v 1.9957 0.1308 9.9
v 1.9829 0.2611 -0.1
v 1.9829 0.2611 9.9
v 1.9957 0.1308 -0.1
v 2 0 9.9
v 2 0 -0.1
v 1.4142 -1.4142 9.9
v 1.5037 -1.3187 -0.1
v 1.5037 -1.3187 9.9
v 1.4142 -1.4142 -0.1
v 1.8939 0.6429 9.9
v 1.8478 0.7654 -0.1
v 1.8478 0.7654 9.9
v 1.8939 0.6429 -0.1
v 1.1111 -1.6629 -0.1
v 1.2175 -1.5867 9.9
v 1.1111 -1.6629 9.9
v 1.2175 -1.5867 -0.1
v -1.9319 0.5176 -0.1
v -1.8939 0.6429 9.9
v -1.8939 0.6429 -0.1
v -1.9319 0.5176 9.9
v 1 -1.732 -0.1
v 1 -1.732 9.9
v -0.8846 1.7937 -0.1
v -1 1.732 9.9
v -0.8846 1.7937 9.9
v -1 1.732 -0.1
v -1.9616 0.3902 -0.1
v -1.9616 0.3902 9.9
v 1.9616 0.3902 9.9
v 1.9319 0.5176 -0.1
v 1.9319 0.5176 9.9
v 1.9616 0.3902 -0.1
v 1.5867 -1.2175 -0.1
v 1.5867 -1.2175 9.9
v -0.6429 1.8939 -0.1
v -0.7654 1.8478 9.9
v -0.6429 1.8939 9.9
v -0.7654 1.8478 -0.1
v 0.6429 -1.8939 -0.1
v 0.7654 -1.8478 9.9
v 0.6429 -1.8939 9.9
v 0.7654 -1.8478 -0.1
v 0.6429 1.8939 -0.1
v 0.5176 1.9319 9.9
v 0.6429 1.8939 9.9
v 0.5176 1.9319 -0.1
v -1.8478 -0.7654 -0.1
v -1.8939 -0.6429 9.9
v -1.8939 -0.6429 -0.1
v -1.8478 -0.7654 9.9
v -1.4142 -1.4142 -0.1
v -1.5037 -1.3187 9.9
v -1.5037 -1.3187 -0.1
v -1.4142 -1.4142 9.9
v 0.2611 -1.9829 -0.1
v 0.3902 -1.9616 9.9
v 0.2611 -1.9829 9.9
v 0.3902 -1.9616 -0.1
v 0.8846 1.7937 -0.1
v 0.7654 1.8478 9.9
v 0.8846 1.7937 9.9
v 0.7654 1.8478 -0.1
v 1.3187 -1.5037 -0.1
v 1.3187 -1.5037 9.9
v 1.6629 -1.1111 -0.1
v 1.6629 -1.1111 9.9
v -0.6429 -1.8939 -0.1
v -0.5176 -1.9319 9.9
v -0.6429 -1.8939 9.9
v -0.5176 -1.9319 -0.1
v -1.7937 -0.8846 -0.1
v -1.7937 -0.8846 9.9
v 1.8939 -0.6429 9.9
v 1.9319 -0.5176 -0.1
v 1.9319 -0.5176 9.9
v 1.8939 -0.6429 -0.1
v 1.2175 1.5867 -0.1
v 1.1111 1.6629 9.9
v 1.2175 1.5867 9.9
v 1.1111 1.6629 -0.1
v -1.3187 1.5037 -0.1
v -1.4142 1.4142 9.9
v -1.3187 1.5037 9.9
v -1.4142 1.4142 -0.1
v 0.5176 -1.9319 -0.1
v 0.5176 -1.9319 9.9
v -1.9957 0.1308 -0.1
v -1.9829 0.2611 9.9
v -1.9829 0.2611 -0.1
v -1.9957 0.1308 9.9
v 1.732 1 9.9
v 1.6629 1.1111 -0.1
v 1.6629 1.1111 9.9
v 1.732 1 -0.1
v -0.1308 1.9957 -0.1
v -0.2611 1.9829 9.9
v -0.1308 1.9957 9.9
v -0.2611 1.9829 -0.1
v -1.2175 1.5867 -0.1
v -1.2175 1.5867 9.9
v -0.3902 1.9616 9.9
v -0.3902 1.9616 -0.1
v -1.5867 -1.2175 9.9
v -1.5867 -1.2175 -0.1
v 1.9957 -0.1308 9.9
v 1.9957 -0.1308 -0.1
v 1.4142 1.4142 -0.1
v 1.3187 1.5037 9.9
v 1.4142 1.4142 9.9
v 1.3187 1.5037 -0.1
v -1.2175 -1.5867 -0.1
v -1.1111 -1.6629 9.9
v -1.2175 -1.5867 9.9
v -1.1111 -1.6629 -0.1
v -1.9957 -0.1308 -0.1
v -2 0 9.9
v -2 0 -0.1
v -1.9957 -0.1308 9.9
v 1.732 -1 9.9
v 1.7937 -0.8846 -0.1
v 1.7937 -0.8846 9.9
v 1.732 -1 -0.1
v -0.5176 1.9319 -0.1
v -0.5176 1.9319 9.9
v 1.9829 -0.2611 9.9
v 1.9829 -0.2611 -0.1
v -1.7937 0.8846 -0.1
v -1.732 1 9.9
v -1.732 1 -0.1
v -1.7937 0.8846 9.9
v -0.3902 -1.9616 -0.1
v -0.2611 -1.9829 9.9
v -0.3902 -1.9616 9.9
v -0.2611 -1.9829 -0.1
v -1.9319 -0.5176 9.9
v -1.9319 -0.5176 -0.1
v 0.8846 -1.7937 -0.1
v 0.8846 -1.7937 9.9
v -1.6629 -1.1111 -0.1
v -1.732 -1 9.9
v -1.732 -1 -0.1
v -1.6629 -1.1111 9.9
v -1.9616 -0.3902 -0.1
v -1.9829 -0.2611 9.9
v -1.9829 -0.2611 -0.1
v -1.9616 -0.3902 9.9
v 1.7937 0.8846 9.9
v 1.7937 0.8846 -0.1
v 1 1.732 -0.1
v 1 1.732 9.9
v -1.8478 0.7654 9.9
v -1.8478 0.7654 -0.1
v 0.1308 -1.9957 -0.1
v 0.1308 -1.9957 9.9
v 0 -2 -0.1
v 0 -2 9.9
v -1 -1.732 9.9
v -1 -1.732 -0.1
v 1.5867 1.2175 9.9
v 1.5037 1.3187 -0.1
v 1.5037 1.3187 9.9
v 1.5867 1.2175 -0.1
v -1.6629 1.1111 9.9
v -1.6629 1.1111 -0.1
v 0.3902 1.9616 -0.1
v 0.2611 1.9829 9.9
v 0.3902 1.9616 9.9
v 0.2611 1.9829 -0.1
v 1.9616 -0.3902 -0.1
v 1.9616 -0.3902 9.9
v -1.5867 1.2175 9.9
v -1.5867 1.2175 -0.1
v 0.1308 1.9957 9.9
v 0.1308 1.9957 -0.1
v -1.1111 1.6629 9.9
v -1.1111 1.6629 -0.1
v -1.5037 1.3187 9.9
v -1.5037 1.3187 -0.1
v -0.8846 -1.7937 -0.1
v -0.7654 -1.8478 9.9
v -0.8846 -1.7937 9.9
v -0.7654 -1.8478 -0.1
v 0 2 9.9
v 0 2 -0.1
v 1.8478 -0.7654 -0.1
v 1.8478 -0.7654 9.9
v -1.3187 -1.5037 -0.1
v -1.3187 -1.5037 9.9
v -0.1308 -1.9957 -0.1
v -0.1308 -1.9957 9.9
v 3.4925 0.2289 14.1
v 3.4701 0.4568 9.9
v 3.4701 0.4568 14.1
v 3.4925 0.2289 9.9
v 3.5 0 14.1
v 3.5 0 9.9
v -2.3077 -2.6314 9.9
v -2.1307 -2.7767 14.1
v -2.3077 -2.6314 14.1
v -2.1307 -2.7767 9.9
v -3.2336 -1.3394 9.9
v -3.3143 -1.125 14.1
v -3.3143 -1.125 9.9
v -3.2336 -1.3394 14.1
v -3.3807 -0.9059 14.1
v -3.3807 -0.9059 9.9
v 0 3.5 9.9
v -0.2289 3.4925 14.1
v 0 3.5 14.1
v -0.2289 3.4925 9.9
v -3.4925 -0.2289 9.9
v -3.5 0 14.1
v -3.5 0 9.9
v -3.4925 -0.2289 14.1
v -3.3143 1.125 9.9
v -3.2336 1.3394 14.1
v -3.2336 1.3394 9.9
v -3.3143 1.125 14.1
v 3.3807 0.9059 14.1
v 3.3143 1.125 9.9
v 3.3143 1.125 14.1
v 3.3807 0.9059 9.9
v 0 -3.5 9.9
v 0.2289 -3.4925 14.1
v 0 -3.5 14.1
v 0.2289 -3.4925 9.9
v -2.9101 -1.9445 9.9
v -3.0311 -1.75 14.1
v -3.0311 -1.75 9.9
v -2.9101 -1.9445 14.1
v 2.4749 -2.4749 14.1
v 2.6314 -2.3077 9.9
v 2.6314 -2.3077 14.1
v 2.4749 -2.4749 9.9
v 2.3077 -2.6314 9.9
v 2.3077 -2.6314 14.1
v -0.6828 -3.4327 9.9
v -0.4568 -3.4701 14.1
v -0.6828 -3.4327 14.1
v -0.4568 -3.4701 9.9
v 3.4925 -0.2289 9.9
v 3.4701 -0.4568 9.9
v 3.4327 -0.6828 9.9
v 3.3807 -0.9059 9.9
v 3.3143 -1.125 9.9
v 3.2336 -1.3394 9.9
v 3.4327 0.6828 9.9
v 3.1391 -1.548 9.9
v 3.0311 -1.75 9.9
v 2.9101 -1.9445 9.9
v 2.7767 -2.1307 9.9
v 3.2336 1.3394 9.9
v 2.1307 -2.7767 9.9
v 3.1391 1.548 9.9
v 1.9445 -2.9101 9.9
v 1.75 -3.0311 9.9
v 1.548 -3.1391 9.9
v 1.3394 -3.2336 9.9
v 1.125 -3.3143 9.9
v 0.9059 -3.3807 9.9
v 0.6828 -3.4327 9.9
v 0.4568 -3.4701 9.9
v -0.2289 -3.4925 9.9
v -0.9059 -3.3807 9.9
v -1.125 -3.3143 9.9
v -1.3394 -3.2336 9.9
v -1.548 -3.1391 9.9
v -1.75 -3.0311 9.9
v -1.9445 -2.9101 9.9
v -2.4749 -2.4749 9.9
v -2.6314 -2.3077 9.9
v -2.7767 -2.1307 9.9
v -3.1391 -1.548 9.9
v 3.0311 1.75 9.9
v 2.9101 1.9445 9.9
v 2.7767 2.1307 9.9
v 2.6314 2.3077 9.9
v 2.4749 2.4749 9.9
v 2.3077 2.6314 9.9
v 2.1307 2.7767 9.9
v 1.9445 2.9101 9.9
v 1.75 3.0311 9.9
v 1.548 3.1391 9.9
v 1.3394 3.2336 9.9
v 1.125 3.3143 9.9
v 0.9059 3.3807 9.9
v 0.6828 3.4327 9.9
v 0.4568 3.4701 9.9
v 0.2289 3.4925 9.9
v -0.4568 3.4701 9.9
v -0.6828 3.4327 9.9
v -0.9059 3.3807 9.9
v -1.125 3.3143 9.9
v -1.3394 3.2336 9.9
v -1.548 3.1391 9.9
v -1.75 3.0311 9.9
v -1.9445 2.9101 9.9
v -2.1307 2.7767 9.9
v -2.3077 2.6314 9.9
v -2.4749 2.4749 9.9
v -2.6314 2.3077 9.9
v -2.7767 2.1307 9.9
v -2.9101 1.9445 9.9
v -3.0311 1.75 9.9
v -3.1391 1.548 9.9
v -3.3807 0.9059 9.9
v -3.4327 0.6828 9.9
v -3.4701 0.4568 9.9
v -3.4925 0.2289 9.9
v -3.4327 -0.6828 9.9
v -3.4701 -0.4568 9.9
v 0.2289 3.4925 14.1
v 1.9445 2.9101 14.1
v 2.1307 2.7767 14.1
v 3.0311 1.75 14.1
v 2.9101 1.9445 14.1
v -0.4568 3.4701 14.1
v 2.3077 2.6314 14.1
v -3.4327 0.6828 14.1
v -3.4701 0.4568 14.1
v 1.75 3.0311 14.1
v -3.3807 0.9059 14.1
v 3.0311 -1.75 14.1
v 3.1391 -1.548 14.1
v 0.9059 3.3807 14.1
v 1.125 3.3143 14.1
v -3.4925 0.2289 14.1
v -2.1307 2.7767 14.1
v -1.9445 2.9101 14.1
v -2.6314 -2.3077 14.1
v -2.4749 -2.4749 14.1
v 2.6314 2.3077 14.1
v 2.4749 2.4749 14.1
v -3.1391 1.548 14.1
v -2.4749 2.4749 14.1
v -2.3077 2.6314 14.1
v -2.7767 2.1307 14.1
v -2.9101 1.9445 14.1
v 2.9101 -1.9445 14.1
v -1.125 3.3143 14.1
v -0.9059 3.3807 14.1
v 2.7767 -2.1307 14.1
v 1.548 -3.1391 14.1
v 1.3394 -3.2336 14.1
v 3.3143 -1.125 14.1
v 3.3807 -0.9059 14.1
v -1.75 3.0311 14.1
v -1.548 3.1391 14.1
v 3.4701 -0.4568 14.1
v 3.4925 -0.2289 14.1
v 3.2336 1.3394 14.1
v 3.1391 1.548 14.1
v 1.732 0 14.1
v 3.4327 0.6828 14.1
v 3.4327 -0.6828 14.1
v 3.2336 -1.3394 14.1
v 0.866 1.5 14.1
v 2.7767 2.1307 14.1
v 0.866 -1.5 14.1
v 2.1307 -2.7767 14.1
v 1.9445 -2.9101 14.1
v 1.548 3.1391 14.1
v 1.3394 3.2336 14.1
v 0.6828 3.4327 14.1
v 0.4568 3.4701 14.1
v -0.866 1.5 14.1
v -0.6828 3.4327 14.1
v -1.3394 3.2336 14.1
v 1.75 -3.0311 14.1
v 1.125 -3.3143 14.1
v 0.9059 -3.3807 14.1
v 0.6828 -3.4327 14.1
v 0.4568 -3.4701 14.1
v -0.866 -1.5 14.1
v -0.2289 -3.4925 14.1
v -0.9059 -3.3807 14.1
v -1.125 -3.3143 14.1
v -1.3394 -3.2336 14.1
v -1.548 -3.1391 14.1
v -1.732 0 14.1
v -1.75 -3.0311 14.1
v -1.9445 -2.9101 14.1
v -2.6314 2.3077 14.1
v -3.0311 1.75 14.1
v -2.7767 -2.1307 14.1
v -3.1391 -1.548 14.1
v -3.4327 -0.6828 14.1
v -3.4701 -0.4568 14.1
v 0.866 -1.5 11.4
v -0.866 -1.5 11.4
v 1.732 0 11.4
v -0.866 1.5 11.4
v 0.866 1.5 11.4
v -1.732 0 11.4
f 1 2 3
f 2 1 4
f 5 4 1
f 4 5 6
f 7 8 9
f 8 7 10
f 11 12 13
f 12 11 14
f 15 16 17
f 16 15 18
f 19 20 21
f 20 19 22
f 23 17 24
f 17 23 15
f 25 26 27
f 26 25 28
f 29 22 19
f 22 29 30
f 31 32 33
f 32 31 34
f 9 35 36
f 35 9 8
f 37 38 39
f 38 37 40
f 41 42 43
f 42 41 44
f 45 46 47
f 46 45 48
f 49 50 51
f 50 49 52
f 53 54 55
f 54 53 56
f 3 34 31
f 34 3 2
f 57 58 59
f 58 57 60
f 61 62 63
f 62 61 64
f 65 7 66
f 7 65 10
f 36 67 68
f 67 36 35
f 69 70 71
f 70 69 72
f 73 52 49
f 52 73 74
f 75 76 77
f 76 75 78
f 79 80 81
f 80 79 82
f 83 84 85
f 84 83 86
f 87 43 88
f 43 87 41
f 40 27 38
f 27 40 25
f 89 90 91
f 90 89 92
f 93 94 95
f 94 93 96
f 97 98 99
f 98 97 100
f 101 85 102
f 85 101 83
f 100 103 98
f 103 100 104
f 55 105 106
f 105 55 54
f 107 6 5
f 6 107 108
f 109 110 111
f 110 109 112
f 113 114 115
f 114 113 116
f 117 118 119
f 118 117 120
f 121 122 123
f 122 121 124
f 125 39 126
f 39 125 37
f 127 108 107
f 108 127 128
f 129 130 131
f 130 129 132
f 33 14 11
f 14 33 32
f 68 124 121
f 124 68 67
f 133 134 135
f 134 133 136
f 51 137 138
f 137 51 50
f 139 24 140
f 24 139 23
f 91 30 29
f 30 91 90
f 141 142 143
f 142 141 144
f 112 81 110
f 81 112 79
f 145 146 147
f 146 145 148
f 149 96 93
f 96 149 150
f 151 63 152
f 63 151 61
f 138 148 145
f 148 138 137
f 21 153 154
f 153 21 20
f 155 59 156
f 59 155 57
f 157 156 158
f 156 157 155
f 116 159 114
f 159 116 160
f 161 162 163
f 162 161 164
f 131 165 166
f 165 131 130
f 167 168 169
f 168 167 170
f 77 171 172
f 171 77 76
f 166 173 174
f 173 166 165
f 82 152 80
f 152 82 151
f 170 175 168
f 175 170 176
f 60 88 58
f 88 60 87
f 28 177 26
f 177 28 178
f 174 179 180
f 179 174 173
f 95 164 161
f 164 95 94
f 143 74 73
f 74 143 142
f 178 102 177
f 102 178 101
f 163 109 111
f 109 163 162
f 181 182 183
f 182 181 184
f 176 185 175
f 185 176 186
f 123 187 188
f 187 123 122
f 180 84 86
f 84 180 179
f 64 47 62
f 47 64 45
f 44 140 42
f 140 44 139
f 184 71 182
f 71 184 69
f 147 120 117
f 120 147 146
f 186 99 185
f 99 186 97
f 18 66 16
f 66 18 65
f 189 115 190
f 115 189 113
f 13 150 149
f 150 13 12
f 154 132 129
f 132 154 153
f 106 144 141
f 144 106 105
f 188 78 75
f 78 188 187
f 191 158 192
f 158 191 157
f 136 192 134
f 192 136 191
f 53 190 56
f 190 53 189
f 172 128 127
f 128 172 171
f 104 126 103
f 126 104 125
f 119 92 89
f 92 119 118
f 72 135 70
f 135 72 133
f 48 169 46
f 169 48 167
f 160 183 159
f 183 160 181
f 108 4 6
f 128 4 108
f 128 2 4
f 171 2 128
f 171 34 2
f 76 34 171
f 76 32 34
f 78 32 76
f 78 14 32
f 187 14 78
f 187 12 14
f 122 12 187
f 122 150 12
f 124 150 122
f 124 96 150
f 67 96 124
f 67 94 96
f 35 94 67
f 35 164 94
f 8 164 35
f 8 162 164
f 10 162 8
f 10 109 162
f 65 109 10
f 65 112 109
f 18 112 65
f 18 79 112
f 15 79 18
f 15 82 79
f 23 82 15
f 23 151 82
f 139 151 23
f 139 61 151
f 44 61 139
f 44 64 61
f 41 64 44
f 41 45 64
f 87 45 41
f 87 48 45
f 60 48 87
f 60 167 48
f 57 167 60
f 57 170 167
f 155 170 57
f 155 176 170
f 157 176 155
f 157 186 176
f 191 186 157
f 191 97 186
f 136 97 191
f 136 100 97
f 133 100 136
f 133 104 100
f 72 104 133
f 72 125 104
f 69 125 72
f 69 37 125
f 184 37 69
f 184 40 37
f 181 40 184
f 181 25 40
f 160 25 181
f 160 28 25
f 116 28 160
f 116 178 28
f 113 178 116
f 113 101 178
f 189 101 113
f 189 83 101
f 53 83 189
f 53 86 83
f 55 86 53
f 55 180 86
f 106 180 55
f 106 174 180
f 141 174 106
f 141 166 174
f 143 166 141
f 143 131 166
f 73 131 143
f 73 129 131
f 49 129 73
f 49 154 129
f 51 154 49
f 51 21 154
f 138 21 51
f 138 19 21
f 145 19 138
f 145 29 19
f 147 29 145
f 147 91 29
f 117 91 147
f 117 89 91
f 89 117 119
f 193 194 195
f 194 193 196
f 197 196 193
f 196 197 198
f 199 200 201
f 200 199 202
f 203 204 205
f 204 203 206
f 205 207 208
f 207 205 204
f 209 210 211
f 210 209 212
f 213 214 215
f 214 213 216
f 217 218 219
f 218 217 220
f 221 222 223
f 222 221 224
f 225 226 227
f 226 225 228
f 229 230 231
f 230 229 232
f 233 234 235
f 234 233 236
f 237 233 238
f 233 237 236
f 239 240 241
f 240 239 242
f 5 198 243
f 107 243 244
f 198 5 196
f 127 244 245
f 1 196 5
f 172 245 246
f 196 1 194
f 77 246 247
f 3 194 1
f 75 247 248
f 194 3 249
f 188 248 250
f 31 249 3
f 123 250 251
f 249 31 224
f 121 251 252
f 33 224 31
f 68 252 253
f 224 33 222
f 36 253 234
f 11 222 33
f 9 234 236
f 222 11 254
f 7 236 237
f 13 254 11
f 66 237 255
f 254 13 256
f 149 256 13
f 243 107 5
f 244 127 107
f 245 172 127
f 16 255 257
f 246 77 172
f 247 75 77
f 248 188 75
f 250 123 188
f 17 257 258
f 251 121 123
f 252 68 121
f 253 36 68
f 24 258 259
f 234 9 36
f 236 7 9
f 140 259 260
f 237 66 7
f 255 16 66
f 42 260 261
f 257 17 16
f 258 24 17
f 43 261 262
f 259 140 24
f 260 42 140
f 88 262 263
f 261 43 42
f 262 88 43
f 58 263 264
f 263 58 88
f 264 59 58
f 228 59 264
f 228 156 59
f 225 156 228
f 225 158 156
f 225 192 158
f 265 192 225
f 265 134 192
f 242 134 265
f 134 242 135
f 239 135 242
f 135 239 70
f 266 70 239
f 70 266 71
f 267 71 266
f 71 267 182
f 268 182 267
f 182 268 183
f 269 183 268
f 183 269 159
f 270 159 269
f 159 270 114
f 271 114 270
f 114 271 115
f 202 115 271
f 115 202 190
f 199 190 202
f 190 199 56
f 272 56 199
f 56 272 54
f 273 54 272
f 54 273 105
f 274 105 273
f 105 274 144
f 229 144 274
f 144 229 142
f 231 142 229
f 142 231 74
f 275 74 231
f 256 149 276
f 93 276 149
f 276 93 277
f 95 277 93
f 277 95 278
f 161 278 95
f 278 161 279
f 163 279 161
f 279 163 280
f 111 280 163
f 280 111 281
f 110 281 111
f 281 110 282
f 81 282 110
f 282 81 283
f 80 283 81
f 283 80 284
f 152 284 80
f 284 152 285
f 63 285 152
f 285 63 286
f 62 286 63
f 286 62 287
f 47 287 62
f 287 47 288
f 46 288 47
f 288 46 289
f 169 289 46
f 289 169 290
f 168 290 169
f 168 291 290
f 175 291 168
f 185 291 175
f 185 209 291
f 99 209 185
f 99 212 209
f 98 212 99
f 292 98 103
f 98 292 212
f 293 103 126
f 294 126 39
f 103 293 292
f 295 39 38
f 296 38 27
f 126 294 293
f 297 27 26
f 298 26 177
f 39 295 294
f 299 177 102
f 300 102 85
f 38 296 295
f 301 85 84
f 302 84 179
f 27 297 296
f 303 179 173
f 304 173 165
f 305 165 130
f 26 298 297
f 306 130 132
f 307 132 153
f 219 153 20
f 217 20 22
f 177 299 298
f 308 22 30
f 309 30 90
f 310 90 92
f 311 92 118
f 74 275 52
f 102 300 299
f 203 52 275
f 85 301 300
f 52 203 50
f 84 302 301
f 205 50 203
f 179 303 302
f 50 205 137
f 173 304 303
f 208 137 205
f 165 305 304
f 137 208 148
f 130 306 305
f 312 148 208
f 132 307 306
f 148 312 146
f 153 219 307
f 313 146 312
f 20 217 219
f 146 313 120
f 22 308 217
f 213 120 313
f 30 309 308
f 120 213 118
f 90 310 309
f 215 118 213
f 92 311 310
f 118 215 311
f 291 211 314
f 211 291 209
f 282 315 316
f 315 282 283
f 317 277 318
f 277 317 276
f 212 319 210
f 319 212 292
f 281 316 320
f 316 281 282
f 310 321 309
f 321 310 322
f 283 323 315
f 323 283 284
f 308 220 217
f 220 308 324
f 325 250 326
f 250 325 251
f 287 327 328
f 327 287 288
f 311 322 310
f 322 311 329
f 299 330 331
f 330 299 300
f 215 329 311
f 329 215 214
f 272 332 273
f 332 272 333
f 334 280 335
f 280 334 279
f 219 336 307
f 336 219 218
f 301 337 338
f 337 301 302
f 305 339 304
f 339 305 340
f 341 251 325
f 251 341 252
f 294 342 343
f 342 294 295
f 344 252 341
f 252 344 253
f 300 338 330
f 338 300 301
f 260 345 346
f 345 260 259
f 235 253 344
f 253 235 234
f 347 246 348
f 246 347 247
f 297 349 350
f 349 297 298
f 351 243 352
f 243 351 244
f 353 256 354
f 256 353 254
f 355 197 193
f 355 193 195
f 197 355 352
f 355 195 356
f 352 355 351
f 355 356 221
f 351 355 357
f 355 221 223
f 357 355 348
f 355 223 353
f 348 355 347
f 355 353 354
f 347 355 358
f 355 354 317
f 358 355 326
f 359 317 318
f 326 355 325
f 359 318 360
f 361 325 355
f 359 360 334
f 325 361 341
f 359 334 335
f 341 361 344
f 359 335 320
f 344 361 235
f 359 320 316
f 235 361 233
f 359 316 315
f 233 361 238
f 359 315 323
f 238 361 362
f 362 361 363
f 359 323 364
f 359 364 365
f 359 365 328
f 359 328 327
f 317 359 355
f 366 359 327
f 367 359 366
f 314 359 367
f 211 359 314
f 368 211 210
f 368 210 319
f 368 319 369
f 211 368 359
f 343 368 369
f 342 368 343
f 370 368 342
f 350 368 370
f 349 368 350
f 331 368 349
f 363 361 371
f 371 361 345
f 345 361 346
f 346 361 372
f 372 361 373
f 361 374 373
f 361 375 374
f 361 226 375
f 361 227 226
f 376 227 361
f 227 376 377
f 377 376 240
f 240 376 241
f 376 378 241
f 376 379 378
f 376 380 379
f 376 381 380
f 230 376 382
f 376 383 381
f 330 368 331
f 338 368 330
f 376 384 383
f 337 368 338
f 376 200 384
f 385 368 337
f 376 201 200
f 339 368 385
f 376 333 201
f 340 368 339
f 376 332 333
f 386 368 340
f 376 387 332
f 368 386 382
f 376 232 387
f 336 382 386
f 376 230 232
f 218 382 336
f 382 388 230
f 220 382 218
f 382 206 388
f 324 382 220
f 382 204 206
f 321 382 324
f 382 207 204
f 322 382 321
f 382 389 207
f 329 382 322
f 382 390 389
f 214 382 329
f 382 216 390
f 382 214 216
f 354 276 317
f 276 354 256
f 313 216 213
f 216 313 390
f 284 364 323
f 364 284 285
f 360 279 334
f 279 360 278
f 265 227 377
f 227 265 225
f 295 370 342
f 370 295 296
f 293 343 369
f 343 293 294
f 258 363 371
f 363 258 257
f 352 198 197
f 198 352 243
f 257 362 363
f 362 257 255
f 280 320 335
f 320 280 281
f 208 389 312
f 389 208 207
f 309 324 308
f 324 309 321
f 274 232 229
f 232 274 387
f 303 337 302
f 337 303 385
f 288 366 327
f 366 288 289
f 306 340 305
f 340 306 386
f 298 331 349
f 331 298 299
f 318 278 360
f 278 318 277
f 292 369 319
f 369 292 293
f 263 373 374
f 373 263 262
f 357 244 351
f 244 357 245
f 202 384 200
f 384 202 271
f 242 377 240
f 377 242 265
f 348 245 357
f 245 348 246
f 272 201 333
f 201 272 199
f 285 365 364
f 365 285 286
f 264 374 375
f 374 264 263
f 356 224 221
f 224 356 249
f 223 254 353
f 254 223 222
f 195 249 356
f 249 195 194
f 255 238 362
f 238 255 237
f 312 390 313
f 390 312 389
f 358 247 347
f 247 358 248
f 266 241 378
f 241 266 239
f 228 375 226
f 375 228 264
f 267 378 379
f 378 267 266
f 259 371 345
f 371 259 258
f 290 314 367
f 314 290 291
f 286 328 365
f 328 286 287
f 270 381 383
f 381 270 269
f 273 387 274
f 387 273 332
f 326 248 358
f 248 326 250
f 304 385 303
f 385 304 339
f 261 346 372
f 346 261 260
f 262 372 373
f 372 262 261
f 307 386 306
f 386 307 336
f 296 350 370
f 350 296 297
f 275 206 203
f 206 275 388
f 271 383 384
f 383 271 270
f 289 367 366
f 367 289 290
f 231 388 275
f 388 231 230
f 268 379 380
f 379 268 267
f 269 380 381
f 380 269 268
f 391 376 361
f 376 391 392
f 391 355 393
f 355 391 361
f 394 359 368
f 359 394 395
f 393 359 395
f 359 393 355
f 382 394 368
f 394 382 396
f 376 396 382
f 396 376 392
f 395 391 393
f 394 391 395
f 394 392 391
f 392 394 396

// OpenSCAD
// Socket Head Cap Screw (M4-like) — single connected solid
// Dimensions: shank Ø4.0, head Ø7.0, head height 4.0, length under head 10.0

thread_diameter_mm = 4.0;      //[2.0:8.0:0.1]
length_mm          = 10.0;     //[5.0:20.0:0.5]   // under-head length
head_diameter_mm   = 7.0;      //[3.5:14.0:0.1]
head_height_mm     = 4.0;      //[2.0:8.0:0.1]
socket_af_mm       = 3.0;      //[1.5:6.0:0.1]    // hex across flats
socket_depth_mm    = 2.5;      //[1.0:4.0:0.1]
tip_chamfer_height_mm = 0.8;   //[0.3:2.0:0.1]
overlap_mm         = 0.2;      //[0.05:1.0:0.05]

$fn = 96;

module socket_head_cap_screw() {
  shank_r = thread_diameter_mm/2;
  head_r  = head_diameter_mm/2;

  // Place screw along +Z (head on top, tip at bottom) for clear ortho views
  z_head_center  = length_mm + head_height_mm/2;
  z_shank_center = length_mm/2;
  z_tip_center   = tip_chamfer_height_mm/2;

  difference() {
    // ONE connected solid (head + shank + tip) with slight overlaps
    union() {
      // Shank (under head)
      translate([0, 0, z_shank_center])
        cylinder(r=shank_r, h=length_mm + overlap_mm, center=true);

      // Tip chamfer (cone)
      translate([0, 0, z_tip_center])
        cylinder(r1=0, r2=shank_r, h=tip_chamfer_height_mm, center=true);

      // Head
      translate([0, 0, z_head_center])
        cylinder(r=head_r, h=head_height_mm + overlap_mm, center=true);
    }

    // Hex socket recess (subtracted from head)
    // Hex cylinder radius from across-flats: R = (AF/2)/cos(30)
    socket_R = (socket_af_mm/2)/cos(30);
    z_socket_center = length_mm + head_height_mm - socket_depth_mm/2;

    translate([0, 0, z_socket_center])
      cylinder(r=socket_R, h=socket_depth_mm + 0.2, center=true, $fn=6);
  }
}

socket_head_cap_screw();
